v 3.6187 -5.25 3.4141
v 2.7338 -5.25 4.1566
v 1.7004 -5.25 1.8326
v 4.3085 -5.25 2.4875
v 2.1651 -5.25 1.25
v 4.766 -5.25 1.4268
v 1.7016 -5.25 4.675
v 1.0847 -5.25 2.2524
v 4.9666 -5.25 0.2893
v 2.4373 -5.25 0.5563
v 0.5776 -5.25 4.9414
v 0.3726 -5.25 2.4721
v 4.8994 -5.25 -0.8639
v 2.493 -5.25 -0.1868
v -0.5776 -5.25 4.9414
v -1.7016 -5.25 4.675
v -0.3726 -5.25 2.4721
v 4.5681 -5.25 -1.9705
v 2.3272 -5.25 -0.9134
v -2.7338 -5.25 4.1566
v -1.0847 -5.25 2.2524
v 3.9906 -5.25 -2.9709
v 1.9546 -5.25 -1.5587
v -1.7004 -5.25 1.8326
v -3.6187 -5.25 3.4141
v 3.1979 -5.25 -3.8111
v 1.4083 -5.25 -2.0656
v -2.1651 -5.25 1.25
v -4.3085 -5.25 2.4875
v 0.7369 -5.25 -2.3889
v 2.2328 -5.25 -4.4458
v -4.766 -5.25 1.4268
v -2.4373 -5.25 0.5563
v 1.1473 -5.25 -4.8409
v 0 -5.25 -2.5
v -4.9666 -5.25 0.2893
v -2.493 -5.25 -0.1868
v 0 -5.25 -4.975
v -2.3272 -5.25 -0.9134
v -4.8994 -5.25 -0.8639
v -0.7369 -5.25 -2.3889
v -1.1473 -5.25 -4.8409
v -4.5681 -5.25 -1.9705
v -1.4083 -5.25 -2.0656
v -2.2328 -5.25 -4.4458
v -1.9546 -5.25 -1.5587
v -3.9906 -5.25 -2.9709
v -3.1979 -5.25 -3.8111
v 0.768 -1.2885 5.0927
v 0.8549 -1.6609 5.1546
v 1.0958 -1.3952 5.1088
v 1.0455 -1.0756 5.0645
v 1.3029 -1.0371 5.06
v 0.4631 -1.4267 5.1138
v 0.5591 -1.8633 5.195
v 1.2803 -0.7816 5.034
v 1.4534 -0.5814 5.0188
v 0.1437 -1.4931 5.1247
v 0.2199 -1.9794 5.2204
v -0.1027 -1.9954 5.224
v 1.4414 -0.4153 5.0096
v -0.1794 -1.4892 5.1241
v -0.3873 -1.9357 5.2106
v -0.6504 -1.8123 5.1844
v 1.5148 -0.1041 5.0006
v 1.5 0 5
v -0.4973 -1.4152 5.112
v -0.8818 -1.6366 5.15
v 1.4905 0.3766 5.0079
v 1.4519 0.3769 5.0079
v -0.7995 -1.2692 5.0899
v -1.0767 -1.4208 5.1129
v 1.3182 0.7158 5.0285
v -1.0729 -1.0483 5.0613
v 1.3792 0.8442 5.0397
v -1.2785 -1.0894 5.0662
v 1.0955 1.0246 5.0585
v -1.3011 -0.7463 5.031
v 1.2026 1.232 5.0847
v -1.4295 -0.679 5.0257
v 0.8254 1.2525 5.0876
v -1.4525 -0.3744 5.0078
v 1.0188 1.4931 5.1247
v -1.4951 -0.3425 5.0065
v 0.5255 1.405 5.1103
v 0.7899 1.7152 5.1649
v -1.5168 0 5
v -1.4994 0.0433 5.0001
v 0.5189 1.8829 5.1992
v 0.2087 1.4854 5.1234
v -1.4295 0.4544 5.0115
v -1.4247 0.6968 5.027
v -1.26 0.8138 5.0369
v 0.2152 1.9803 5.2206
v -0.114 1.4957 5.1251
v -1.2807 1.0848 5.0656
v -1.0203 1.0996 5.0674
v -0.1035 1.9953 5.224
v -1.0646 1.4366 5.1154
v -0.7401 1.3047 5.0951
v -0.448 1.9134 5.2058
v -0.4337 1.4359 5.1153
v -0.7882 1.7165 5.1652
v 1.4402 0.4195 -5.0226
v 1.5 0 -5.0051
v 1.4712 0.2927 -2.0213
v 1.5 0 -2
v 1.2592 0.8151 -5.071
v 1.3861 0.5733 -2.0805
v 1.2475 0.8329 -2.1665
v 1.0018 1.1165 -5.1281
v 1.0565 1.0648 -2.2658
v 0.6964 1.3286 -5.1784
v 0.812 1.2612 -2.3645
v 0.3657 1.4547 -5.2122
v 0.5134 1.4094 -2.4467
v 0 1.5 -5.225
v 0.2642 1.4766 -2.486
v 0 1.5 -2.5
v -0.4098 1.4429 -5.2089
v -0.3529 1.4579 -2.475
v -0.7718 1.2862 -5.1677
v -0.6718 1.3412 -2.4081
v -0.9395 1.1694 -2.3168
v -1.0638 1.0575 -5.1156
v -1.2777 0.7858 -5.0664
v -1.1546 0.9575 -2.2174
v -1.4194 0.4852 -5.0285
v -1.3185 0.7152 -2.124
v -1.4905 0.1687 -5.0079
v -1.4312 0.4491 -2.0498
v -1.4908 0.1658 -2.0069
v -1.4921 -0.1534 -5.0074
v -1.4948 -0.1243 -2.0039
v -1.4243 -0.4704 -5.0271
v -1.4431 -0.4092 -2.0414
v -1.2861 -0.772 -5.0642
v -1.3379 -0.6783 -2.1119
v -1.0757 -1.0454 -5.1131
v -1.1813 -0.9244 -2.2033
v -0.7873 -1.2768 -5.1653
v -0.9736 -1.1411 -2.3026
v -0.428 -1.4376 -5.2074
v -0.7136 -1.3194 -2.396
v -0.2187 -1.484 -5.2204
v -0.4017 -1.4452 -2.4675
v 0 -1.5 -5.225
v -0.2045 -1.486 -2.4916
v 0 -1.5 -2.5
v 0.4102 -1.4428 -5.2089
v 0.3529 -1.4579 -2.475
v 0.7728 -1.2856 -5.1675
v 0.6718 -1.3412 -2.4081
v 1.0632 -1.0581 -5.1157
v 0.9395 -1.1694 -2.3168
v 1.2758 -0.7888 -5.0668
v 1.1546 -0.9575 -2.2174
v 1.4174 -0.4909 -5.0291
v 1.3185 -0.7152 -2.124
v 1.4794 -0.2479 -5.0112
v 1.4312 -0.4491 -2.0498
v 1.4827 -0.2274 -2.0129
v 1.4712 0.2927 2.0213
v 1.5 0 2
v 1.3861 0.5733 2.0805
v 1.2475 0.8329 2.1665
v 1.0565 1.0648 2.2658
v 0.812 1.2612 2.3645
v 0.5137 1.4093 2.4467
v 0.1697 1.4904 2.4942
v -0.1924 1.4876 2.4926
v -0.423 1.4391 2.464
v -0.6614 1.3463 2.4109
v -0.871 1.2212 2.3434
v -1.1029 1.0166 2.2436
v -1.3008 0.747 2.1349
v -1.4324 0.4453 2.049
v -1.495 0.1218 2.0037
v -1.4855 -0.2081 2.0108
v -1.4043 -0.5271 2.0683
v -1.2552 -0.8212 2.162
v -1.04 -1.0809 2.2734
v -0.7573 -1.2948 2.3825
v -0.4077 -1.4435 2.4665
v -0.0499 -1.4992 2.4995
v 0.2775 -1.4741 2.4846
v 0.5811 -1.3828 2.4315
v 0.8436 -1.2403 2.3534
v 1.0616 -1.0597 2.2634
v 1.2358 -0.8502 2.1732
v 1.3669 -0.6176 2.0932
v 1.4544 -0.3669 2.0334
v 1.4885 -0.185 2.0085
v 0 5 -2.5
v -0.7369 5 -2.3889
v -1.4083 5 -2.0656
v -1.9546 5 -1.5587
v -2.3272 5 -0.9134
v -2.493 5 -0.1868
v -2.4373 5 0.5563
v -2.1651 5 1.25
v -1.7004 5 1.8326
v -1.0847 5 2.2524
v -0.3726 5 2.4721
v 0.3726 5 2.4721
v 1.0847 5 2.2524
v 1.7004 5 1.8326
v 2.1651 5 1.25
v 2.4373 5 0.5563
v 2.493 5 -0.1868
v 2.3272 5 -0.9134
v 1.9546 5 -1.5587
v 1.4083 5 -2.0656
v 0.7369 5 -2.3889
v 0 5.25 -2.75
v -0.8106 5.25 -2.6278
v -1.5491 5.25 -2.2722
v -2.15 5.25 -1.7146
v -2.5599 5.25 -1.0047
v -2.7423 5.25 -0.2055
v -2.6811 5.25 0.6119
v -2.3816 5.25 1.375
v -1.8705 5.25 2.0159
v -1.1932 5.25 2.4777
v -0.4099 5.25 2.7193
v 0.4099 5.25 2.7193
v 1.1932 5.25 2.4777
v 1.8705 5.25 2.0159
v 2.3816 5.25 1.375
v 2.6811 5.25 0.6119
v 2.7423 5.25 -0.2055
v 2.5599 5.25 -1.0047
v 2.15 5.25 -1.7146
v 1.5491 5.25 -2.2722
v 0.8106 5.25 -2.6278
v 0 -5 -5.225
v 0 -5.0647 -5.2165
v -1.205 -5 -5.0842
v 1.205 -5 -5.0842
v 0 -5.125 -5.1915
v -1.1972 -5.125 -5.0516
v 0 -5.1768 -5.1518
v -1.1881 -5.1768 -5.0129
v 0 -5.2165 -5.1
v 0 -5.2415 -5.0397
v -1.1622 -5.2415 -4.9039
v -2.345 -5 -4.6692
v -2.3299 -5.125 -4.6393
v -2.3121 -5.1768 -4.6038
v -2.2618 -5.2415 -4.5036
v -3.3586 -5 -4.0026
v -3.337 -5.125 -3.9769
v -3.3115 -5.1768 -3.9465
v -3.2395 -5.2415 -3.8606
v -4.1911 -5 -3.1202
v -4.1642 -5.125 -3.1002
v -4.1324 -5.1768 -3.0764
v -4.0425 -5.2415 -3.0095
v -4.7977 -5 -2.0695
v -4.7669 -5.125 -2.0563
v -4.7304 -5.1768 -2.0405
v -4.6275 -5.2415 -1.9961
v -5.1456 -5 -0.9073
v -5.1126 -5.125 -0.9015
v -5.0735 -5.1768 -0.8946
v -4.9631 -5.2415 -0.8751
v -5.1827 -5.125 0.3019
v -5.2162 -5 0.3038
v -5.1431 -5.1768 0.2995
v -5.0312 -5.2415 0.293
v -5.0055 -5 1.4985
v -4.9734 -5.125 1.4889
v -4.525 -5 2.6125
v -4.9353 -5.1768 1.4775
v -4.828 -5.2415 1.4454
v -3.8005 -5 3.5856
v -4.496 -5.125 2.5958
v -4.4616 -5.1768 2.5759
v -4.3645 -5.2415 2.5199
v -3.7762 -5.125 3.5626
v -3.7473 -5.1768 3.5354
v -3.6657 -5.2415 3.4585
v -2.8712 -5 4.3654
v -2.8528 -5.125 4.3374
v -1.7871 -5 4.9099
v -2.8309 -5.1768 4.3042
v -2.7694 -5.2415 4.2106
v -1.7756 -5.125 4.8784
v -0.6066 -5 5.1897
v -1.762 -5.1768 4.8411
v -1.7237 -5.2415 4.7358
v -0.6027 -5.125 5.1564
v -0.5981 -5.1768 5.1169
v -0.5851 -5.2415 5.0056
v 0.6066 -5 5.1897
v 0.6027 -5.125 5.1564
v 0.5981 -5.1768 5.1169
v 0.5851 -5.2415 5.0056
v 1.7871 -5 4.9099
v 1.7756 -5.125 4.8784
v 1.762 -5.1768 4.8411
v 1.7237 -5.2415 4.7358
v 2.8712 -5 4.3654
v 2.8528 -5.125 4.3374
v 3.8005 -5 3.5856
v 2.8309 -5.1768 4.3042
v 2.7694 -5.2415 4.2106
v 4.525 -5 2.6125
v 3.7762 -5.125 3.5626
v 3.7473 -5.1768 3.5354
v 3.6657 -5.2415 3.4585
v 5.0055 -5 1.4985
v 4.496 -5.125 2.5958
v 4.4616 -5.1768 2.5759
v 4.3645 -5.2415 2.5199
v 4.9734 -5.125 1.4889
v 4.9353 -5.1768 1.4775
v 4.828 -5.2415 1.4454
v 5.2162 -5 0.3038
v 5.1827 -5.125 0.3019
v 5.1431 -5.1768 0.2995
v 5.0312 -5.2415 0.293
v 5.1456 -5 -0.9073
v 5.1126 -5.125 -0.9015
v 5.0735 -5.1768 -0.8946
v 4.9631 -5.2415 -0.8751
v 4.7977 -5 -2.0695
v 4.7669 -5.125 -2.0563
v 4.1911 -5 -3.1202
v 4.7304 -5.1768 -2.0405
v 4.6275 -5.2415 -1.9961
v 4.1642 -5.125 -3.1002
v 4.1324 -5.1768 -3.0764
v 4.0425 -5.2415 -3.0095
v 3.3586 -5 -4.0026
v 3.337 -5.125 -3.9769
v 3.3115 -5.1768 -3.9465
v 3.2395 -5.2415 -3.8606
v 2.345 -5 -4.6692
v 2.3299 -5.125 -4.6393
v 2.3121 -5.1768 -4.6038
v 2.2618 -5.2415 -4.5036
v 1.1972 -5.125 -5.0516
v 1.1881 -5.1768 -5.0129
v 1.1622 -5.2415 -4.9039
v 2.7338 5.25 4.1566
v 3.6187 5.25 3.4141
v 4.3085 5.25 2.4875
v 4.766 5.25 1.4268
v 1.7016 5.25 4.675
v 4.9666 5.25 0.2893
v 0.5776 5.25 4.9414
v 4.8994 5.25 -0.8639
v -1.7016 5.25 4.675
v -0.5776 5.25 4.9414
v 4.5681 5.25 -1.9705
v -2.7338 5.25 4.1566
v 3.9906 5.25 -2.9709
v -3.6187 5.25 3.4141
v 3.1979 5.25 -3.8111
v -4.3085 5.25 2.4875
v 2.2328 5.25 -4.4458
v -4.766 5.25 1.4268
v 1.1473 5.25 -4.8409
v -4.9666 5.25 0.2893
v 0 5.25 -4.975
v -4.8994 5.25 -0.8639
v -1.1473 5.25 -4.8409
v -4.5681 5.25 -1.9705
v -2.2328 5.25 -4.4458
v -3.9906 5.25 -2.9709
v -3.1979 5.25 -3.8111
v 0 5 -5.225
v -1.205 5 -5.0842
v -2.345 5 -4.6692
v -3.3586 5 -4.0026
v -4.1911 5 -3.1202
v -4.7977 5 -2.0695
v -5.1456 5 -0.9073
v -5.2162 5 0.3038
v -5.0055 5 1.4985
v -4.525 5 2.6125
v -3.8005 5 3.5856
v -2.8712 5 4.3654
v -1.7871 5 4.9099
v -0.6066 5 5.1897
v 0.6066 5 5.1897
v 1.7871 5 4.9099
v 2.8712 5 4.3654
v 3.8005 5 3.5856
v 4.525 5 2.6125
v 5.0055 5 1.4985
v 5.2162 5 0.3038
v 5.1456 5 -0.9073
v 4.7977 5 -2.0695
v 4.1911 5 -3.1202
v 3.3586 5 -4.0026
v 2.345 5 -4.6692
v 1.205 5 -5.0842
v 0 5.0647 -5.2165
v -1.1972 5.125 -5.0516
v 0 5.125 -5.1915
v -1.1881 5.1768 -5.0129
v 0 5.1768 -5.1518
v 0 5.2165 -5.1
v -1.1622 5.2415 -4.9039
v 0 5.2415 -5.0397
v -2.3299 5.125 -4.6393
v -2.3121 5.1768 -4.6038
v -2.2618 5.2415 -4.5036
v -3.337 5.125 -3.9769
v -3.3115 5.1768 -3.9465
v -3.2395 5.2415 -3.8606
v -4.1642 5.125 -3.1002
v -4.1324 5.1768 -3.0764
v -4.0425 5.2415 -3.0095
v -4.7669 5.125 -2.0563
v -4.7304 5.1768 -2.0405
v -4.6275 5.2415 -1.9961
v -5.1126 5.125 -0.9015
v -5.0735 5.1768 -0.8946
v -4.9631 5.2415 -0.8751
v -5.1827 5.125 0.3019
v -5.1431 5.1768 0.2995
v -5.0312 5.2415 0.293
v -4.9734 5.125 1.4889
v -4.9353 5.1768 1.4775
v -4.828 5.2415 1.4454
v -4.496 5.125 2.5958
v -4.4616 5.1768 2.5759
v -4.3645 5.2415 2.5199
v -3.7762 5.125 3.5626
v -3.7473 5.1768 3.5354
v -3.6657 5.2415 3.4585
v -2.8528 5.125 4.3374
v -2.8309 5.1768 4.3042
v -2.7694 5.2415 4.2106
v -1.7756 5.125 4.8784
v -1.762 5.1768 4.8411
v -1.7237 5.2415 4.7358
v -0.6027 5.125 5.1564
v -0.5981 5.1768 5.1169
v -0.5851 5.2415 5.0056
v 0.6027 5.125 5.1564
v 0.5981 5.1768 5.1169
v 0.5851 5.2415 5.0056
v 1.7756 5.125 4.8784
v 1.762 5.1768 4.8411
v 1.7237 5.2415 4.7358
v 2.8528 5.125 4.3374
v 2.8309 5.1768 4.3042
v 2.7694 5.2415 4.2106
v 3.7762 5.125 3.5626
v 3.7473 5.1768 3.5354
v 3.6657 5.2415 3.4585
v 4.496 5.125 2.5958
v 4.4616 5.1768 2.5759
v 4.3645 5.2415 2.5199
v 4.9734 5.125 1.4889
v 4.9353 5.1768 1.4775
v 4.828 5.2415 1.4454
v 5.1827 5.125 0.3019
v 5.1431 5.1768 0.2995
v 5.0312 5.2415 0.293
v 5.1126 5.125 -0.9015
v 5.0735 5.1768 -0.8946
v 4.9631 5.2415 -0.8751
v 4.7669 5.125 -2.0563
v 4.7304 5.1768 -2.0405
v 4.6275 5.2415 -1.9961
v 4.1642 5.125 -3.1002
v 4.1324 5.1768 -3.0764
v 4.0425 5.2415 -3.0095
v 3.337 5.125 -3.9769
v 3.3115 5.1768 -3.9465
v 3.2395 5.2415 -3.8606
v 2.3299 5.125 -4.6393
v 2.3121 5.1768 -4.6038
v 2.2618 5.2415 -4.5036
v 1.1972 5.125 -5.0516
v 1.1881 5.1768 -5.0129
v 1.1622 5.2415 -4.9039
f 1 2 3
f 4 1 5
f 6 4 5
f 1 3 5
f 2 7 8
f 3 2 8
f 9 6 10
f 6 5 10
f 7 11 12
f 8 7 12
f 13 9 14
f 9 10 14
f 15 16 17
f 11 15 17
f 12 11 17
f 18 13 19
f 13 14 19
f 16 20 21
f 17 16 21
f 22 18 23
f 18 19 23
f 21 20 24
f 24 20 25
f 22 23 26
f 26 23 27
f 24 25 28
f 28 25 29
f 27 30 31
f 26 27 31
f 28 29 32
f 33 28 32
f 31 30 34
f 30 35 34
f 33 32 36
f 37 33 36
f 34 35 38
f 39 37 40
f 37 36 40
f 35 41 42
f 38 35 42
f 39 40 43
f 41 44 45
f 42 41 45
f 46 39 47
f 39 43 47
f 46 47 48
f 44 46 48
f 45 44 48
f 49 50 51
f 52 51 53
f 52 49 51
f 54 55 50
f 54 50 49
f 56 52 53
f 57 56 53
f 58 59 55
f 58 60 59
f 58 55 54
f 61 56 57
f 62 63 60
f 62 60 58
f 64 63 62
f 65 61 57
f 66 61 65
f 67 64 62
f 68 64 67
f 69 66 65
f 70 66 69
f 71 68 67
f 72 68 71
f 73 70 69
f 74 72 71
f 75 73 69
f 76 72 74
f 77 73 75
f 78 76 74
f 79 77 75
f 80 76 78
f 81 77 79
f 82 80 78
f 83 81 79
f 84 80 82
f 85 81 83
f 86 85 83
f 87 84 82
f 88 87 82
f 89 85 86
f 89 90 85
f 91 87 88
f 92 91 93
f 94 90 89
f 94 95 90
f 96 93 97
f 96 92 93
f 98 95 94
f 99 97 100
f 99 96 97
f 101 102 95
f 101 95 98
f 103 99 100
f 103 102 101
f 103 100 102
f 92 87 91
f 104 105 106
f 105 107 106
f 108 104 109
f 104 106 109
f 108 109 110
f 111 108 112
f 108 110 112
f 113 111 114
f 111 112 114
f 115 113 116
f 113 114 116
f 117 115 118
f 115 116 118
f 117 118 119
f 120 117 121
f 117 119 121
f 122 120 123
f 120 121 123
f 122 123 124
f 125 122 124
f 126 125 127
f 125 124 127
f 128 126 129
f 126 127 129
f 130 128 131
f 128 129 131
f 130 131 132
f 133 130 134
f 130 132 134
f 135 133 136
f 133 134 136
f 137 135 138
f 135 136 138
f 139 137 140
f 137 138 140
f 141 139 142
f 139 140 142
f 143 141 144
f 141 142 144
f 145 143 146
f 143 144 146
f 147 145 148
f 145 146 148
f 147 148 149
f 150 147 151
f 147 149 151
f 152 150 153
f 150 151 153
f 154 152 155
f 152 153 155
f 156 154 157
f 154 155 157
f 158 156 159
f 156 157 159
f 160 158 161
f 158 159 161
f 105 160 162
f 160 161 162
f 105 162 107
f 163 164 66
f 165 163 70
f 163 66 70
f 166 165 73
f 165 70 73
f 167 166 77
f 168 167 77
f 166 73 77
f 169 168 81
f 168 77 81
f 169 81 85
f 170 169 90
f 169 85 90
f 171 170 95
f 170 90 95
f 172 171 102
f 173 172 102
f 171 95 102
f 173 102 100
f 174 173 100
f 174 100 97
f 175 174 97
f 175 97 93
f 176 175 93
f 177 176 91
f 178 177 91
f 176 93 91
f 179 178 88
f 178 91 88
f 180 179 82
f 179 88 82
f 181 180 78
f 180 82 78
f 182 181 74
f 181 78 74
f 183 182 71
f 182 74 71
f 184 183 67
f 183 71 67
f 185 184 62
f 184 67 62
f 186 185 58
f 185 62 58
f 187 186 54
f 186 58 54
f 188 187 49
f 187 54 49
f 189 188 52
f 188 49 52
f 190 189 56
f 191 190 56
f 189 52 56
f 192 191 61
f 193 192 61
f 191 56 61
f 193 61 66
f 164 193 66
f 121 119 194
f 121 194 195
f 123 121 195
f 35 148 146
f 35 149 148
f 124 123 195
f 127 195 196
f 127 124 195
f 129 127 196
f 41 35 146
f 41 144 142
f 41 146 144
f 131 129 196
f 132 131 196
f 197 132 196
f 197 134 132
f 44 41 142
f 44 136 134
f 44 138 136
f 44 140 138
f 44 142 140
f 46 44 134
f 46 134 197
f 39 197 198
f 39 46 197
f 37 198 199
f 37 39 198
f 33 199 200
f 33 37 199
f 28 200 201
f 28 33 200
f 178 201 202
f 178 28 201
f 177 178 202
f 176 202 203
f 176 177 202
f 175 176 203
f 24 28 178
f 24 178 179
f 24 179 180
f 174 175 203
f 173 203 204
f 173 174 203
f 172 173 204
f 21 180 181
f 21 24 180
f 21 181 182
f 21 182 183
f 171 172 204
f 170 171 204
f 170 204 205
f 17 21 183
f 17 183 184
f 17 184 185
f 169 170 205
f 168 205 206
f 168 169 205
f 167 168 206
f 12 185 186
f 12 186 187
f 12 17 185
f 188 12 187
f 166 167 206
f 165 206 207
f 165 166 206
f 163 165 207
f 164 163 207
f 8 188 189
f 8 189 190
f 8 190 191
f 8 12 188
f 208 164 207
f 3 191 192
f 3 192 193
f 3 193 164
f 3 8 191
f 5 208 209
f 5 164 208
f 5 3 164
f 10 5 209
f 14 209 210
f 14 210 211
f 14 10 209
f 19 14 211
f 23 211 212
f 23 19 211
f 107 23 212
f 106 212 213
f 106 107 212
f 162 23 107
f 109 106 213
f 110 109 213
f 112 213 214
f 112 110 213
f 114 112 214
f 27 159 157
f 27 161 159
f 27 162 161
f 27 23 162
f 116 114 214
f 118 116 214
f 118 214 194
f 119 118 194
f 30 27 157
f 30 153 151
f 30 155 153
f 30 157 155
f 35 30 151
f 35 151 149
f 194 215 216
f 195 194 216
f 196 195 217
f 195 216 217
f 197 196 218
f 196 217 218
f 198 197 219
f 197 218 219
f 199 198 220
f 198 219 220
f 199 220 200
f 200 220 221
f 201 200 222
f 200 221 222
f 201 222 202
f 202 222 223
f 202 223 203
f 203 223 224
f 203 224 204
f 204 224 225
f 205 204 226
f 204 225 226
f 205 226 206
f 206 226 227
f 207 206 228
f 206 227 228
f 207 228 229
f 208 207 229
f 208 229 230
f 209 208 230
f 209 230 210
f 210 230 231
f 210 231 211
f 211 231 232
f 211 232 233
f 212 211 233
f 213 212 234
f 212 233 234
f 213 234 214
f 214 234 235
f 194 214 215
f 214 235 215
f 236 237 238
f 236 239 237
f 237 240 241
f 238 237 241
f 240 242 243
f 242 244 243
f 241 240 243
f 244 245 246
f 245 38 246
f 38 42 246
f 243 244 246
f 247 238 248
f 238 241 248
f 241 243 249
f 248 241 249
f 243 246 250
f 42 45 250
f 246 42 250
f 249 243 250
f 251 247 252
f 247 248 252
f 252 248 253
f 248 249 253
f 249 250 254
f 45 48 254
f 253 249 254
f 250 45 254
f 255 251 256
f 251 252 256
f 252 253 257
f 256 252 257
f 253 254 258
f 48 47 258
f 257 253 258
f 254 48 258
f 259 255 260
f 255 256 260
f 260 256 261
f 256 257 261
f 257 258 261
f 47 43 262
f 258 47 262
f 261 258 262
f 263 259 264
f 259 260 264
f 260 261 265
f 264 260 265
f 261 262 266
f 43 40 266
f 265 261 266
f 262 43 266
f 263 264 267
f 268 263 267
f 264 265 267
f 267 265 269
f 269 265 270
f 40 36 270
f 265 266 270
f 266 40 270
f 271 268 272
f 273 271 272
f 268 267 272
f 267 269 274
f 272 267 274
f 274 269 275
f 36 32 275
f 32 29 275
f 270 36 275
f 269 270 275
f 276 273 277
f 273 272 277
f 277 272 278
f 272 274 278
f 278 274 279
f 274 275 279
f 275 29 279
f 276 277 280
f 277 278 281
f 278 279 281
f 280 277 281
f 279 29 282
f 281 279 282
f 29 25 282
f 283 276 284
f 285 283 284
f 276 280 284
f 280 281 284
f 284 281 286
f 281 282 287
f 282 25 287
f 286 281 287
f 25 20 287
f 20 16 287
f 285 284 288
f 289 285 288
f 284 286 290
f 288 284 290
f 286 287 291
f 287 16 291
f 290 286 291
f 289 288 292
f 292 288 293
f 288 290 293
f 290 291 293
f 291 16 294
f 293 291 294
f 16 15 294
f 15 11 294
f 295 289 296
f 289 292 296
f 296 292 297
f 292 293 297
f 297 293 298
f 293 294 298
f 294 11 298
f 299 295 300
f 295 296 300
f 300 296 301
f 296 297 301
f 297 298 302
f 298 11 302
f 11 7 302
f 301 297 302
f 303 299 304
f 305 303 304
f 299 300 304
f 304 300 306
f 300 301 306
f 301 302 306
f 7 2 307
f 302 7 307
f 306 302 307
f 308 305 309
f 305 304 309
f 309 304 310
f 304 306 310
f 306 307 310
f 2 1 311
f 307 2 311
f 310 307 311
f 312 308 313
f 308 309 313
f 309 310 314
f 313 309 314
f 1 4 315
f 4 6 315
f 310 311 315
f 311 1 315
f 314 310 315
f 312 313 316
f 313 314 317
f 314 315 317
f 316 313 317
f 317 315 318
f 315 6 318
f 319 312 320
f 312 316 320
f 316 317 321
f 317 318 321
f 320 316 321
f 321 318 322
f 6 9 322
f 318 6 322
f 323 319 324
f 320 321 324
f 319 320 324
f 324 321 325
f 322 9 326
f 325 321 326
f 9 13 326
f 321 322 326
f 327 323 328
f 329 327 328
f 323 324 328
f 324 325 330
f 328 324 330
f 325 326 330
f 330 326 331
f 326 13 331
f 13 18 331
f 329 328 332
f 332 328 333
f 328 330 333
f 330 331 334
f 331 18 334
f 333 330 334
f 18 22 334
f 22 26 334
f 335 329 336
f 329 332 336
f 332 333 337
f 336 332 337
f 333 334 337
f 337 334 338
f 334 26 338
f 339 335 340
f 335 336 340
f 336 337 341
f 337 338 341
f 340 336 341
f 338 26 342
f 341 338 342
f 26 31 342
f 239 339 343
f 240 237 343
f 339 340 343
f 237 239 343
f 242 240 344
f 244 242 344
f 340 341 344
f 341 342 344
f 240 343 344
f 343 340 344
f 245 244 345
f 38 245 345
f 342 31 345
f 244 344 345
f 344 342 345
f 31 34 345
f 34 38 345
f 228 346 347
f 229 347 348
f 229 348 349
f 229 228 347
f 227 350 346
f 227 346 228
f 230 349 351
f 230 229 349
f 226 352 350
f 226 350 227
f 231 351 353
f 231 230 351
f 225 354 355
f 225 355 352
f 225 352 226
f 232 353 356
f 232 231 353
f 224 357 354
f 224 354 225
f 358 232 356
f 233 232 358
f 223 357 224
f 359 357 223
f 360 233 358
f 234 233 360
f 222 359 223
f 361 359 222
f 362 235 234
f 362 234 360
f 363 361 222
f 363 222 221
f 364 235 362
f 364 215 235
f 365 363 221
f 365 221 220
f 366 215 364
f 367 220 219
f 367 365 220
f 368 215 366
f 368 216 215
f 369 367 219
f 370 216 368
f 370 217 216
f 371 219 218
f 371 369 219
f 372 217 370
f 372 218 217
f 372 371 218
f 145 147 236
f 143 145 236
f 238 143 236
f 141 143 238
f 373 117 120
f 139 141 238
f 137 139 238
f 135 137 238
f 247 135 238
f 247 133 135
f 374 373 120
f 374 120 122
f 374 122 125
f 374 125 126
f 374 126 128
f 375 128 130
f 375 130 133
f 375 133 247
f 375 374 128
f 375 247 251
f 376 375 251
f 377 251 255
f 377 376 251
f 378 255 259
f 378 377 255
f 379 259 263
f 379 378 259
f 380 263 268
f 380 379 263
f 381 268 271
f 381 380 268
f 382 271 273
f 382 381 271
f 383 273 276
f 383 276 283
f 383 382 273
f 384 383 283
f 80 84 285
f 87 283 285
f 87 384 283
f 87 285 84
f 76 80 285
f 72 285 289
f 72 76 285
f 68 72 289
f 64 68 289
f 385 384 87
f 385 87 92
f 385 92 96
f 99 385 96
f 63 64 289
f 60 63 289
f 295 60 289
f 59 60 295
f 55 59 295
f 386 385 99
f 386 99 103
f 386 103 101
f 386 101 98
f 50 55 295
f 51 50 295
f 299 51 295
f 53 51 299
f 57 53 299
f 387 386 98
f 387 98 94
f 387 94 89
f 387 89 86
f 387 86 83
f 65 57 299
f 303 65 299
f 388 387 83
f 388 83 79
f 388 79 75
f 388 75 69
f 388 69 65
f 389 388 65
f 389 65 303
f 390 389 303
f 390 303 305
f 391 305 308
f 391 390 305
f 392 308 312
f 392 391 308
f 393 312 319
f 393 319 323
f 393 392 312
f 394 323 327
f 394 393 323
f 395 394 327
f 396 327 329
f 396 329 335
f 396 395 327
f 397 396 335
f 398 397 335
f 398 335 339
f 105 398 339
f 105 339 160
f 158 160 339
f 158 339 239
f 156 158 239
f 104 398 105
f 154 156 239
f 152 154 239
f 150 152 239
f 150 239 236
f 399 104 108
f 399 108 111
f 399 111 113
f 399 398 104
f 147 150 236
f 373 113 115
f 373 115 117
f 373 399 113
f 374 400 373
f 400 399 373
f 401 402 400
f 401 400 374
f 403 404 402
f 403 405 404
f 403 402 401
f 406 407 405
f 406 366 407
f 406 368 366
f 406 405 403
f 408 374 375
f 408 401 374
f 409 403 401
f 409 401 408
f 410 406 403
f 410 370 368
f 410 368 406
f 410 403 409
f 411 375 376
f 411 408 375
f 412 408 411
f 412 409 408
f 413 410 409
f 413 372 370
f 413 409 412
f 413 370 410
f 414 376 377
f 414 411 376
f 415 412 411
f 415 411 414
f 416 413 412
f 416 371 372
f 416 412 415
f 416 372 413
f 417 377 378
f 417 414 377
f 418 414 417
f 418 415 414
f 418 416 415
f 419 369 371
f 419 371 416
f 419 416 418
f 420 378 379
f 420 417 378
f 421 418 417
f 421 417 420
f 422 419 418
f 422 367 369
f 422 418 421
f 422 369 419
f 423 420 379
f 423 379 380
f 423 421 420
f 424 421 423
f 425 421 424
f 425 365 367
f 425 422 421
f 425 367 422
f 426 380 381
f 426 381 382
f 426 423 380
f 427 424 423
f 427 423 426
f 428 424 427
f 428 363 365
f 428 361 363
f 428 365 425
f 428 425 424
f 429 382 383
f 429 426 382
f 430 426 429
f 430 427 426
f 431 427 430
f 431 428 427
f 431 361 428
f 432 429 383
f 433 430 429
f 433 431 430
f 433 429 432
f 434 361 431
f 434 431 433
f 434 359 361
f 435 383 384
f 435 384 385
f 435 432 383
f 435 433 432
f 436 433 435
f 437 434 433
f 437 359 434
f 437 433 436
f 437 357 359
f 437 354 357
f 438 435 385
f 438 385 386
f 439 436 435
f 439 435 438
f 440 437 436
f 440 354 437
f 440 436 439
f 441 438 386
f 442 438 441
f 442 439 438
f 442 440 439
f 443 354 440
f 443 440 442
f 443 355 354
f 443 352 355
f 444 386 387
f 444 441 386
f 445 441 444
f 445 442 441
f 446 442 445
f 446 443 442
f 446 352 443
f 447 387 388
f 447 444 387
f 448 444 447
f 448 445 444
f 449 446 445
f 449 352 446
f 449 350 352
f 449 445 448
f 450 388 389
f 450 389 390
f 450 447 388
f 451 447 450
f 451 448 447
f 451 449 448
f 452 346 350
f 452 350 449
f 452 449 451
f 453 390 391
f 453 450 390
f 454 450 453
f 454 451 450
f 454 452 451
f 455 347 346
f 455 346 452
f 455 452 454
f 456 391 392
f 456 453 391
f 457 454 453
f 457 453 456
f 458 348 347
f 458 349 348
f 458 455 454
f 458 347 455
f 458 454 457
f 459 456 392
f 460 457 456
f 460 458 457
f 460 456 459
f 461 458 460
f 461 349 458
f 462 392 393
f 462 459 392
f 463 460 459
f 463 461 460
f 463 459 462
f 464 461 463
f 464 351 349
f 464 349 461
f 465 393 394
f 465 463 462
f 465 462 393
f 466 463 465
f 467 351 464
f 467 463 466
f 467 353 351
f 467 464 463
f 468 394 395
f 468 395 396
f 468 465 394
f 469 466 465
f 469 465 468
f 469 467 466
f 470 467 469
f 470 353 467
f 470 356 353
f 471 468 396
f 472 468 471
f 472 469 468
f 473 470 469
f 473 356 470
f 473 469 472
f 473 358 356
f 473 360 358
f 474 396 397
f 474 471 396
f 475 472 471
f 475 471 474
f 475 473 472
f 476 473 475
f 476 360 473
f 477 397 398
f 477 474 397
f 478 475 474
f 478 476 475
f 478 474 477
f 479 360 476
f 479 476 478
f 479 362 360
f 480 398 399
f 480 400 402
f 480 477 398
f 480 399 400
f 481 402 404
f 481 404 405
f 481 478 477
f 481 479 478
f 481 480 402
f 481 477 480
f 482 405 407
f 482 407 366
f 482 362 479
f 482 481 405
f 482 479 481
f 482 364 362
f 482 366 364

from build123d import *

# Parameters (mm, degrees)
SKETCH1_R               = 5.225
SKETCH1_R_2             = 2.5
BOSS_EXTRUDE1_DEPTH     = 5.25
SKETCH2_R               = 1.5
CUT_EXTRUDE1_DEPTH      = 5.225
CUT_EXTRUDE2_DEPTH      = 10.064422392
CUT_EXTRUDE2_DEPTH_BACK = 10.064422392
SKETCH4_R               = 9
FILLET1_R               = 0.25
CHAMFER1_SIZE           = 0.25


with BuildPart() as part:
    # Sketch1 → Boss-Extrude1 (new, symmetric)
    with BuildSketch(Plane(origin=(0, 0, 0), x_dir=(1, 0, 0), z_dir=(0, 1, 0))):
        with Locations(Location((0, 0, 0), (0, 0, 90))):
            Circle(SKETCH1_R)
        with Locations(Location((0, 0, 0), (0, 0, 90))):
            Circle(SKETCH1_R_2, mode=Mode.SUBTRACT)
    extrude(amount=BOSS_EXTRUDE1_DEPTH, both=True)

    # Sketch2 → Cut-Extrude1 (cut, symmetric)
    with BuildSketch(Plane.XY):
        Circle(SKETCH2_R)
    extrude(amount=CUT_EXTRUDE1_DEPTH, both=True, mode=Mode.SUBTRACT)

    # Sketch4 → Cut-Extrude2 (cut, two sides: drawn at the far end of the back side and taken through both)
    with BuildSketch(Plane(origin=(0, 0, 0), x_dir=(0, 0, -1), z_dir=(1, 0, 0)).offset(-CUT_EXTRUDE2_DEPTH_BACK)):
        with Locations((-14, 0)):
            Circle(SKETCH4_R)
    extrude(amount=CUT_EXTRUDE2_DEPTH + CUT_EXTRUDE2_DEPTH_BACK, mode=Mode.SUBTRACT)

    # Fillet1
    fillet1_edges = [part.edges().sort_by_distance(p)[0] for p in [
        (0, -5.25, 5.225),
        (0, 5.25, 5.225),
    ]]
    fillet(fillet1_edges, radius=FILLET1_R)

    # Chamfer1
    chamfer1_edges = [part.edges().sort_by_distance(p)[0] for p in [
        (0, 5.25, 2.5),
    ]]
    chamfer(chamfer1_edges, length=CHAMFER1_SIZE)


solid = part.part
